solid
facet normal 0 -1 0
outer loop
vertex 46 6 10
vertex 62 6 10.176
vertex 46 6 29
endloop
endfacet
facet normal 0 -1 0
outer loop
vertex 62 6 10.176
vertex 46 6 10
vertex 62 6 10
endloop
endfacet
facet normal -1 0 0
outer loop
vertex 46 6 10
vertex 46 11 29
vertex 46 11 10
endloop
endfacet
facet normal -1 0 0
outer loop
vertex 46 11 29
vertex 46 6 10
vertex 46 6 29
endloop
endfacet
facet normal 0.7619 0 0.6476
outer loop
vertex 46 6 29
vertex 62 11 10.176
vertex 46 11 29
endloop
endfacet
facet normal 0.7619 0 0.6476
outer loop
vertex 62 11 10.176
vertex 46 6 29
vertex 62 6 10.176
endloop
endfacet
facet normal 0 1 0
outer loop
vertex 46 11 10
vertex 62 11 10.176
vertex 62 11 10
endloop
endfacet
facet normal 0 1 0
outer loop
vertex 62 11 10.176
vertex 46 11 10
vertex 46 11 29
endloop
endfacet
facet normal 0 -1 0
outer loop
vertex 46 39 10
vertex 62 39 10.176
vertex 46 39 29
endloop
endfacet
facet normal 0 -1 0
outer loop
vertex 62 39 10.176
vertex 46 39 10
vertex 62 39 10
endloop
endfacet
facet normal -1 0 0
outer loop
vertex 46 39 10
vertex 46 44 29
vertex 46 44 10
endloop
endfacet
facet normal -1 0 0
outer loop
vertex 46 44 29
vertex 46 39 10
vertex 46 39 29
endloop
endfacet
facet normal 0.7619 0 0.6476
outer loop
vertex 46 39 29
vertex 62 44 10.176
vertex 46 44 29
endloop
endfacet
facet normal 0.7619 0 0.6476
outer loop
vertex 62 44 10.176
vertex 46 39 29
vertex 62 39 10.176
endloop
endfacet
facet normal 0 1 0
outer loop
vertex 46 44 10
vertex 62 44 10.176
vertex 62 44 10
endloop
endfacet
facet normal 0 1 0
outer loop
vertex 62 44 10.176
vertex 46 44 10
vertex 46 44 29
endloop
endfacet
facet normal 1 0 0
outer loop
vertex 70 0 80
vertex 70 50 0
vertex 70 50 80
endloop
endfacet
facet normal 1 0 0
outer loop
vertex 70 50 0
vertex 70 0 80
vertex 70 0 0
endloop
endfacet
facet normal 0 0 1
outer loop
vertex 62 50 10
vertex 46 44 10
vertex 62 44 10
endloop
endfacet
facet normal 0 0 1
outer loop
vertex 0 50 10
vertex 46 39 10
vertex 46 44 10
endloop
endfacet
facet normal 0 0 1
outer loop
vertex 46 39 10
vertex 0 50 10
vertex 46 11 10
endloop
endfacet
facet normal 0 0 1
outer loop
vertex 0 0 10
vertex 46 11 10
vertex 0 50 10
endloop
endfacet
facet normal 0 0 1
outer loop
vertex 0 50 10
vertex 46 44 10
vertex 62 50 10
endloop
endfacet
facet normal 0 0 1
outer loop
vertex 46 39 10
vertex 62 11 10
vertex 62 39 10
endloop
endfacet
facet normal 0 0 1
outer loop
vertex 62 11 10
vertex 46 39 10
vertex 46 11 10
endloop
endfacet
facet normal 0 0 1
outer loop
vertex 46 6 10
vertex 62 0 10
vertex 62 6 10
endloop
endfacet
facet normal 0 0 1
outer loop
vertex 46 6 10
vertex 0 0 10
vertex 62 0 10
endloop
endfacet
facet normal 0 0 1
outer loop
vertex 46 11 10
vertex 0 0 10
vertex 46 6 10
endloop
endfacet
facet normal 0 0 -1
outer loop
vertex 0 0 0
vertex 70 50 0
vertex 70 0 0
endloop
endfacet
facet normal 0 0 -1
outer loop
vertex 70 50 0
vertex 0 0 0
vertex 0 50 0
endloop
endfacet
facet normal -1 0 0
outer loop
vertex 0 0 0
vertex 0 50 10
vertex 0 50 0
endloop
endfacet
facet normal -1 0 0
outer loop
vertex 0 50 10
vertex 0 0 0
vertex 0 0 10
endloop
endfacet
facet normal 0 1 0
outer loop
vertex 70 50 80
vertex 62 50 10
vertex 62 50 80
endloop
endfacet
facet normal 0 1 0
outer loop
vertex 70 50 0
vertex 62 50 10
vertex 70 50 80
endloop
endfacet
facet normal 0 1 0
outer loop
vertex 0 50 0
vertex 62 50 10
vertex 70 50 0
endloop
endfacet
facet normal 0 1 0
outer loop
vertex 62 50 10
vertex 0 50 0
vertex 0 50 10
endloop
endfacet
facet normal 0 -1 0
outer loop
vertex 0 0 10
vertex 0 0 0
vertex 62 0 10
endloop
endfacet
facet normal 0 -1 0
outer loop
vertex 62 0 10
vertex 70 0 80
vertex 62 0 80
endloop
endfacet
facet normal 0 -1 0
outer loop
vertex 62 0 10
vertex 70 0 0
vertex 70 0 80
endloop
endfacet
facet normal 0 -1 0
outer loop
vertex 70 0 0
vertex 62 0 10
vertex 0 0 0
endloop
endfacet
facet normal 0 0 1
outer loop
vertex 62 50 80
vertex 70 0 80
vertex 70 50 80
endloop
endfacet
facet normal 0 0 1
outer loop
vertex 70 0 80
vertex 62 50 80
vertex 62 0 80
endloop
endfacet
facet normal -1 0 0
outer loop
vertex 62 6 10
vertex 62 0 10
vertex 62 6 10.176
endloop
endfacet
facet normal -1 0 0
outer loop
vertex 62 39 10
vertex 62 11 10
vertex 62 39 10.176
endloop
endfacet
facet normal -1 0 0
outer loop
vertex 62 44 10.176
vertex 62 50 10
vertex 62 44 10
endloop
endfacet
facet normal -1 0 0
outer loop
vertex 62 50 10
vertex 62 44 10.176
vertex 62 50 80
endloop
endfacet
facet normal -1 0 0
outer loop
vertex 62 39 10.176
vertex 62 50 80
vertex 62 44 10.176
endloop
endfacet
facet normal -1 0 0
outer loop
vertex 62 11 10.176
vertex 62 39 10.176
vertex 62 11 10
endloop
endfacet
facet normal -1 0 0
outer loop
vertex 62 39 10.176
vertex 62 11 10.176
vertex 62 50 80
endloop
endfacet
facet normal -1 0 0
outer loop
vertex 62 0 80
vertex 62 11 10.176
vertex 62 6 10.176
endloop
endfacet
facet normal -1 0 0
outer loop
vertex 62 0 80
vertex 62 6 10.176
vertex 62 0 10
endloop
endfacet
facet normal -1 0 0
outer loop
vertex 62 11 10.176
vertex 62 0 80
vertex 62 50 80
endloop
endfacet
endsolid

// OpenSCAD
$fn = 32;

// ----------------------------------------------------------------------
// Rib bracket: 2-gusset L bracket
// ----------------------------------------------------------------------

// --- parameters (mm) ---
base_l = 70;              // foot length, X
base_w = 50;              // foot width, Y
base_t = 10;              // foot thickness
plate_t = 8;              // upright plate thickness
plate_h = 80;             // overall height
gus_l = 16;               // gusset leg along the foot
gus_h = 20;               // gusset height
gus_t = 5;                // gusset thickness
gus_edge = 6;             // gusset margin from the foot edge
n_gus = 2;                // gusset count

gus_pitch = (base_w - 2 * gus_edge - gus_t) / (n_gus - 1);  // gusset pitch

union() {
  cube([base_l, base_w, base_t]);
  translate([base_l - plate_t, 0, base_t - 1])
    cube([plate_t, base_w, plate_h - base_t + 1]);
  for (i = [0 : n_gus - 1])
    translate([base_l - plate_t - gus_l, gus_edge + i * gus_pitch, base_t - 1])
      rotate([-90, 0, 0])
        linear_extrude(height = gus_t)
          polygon(points = [[0, 0], [gus_l + 1, 0], [0, -gus_h]]);
}
